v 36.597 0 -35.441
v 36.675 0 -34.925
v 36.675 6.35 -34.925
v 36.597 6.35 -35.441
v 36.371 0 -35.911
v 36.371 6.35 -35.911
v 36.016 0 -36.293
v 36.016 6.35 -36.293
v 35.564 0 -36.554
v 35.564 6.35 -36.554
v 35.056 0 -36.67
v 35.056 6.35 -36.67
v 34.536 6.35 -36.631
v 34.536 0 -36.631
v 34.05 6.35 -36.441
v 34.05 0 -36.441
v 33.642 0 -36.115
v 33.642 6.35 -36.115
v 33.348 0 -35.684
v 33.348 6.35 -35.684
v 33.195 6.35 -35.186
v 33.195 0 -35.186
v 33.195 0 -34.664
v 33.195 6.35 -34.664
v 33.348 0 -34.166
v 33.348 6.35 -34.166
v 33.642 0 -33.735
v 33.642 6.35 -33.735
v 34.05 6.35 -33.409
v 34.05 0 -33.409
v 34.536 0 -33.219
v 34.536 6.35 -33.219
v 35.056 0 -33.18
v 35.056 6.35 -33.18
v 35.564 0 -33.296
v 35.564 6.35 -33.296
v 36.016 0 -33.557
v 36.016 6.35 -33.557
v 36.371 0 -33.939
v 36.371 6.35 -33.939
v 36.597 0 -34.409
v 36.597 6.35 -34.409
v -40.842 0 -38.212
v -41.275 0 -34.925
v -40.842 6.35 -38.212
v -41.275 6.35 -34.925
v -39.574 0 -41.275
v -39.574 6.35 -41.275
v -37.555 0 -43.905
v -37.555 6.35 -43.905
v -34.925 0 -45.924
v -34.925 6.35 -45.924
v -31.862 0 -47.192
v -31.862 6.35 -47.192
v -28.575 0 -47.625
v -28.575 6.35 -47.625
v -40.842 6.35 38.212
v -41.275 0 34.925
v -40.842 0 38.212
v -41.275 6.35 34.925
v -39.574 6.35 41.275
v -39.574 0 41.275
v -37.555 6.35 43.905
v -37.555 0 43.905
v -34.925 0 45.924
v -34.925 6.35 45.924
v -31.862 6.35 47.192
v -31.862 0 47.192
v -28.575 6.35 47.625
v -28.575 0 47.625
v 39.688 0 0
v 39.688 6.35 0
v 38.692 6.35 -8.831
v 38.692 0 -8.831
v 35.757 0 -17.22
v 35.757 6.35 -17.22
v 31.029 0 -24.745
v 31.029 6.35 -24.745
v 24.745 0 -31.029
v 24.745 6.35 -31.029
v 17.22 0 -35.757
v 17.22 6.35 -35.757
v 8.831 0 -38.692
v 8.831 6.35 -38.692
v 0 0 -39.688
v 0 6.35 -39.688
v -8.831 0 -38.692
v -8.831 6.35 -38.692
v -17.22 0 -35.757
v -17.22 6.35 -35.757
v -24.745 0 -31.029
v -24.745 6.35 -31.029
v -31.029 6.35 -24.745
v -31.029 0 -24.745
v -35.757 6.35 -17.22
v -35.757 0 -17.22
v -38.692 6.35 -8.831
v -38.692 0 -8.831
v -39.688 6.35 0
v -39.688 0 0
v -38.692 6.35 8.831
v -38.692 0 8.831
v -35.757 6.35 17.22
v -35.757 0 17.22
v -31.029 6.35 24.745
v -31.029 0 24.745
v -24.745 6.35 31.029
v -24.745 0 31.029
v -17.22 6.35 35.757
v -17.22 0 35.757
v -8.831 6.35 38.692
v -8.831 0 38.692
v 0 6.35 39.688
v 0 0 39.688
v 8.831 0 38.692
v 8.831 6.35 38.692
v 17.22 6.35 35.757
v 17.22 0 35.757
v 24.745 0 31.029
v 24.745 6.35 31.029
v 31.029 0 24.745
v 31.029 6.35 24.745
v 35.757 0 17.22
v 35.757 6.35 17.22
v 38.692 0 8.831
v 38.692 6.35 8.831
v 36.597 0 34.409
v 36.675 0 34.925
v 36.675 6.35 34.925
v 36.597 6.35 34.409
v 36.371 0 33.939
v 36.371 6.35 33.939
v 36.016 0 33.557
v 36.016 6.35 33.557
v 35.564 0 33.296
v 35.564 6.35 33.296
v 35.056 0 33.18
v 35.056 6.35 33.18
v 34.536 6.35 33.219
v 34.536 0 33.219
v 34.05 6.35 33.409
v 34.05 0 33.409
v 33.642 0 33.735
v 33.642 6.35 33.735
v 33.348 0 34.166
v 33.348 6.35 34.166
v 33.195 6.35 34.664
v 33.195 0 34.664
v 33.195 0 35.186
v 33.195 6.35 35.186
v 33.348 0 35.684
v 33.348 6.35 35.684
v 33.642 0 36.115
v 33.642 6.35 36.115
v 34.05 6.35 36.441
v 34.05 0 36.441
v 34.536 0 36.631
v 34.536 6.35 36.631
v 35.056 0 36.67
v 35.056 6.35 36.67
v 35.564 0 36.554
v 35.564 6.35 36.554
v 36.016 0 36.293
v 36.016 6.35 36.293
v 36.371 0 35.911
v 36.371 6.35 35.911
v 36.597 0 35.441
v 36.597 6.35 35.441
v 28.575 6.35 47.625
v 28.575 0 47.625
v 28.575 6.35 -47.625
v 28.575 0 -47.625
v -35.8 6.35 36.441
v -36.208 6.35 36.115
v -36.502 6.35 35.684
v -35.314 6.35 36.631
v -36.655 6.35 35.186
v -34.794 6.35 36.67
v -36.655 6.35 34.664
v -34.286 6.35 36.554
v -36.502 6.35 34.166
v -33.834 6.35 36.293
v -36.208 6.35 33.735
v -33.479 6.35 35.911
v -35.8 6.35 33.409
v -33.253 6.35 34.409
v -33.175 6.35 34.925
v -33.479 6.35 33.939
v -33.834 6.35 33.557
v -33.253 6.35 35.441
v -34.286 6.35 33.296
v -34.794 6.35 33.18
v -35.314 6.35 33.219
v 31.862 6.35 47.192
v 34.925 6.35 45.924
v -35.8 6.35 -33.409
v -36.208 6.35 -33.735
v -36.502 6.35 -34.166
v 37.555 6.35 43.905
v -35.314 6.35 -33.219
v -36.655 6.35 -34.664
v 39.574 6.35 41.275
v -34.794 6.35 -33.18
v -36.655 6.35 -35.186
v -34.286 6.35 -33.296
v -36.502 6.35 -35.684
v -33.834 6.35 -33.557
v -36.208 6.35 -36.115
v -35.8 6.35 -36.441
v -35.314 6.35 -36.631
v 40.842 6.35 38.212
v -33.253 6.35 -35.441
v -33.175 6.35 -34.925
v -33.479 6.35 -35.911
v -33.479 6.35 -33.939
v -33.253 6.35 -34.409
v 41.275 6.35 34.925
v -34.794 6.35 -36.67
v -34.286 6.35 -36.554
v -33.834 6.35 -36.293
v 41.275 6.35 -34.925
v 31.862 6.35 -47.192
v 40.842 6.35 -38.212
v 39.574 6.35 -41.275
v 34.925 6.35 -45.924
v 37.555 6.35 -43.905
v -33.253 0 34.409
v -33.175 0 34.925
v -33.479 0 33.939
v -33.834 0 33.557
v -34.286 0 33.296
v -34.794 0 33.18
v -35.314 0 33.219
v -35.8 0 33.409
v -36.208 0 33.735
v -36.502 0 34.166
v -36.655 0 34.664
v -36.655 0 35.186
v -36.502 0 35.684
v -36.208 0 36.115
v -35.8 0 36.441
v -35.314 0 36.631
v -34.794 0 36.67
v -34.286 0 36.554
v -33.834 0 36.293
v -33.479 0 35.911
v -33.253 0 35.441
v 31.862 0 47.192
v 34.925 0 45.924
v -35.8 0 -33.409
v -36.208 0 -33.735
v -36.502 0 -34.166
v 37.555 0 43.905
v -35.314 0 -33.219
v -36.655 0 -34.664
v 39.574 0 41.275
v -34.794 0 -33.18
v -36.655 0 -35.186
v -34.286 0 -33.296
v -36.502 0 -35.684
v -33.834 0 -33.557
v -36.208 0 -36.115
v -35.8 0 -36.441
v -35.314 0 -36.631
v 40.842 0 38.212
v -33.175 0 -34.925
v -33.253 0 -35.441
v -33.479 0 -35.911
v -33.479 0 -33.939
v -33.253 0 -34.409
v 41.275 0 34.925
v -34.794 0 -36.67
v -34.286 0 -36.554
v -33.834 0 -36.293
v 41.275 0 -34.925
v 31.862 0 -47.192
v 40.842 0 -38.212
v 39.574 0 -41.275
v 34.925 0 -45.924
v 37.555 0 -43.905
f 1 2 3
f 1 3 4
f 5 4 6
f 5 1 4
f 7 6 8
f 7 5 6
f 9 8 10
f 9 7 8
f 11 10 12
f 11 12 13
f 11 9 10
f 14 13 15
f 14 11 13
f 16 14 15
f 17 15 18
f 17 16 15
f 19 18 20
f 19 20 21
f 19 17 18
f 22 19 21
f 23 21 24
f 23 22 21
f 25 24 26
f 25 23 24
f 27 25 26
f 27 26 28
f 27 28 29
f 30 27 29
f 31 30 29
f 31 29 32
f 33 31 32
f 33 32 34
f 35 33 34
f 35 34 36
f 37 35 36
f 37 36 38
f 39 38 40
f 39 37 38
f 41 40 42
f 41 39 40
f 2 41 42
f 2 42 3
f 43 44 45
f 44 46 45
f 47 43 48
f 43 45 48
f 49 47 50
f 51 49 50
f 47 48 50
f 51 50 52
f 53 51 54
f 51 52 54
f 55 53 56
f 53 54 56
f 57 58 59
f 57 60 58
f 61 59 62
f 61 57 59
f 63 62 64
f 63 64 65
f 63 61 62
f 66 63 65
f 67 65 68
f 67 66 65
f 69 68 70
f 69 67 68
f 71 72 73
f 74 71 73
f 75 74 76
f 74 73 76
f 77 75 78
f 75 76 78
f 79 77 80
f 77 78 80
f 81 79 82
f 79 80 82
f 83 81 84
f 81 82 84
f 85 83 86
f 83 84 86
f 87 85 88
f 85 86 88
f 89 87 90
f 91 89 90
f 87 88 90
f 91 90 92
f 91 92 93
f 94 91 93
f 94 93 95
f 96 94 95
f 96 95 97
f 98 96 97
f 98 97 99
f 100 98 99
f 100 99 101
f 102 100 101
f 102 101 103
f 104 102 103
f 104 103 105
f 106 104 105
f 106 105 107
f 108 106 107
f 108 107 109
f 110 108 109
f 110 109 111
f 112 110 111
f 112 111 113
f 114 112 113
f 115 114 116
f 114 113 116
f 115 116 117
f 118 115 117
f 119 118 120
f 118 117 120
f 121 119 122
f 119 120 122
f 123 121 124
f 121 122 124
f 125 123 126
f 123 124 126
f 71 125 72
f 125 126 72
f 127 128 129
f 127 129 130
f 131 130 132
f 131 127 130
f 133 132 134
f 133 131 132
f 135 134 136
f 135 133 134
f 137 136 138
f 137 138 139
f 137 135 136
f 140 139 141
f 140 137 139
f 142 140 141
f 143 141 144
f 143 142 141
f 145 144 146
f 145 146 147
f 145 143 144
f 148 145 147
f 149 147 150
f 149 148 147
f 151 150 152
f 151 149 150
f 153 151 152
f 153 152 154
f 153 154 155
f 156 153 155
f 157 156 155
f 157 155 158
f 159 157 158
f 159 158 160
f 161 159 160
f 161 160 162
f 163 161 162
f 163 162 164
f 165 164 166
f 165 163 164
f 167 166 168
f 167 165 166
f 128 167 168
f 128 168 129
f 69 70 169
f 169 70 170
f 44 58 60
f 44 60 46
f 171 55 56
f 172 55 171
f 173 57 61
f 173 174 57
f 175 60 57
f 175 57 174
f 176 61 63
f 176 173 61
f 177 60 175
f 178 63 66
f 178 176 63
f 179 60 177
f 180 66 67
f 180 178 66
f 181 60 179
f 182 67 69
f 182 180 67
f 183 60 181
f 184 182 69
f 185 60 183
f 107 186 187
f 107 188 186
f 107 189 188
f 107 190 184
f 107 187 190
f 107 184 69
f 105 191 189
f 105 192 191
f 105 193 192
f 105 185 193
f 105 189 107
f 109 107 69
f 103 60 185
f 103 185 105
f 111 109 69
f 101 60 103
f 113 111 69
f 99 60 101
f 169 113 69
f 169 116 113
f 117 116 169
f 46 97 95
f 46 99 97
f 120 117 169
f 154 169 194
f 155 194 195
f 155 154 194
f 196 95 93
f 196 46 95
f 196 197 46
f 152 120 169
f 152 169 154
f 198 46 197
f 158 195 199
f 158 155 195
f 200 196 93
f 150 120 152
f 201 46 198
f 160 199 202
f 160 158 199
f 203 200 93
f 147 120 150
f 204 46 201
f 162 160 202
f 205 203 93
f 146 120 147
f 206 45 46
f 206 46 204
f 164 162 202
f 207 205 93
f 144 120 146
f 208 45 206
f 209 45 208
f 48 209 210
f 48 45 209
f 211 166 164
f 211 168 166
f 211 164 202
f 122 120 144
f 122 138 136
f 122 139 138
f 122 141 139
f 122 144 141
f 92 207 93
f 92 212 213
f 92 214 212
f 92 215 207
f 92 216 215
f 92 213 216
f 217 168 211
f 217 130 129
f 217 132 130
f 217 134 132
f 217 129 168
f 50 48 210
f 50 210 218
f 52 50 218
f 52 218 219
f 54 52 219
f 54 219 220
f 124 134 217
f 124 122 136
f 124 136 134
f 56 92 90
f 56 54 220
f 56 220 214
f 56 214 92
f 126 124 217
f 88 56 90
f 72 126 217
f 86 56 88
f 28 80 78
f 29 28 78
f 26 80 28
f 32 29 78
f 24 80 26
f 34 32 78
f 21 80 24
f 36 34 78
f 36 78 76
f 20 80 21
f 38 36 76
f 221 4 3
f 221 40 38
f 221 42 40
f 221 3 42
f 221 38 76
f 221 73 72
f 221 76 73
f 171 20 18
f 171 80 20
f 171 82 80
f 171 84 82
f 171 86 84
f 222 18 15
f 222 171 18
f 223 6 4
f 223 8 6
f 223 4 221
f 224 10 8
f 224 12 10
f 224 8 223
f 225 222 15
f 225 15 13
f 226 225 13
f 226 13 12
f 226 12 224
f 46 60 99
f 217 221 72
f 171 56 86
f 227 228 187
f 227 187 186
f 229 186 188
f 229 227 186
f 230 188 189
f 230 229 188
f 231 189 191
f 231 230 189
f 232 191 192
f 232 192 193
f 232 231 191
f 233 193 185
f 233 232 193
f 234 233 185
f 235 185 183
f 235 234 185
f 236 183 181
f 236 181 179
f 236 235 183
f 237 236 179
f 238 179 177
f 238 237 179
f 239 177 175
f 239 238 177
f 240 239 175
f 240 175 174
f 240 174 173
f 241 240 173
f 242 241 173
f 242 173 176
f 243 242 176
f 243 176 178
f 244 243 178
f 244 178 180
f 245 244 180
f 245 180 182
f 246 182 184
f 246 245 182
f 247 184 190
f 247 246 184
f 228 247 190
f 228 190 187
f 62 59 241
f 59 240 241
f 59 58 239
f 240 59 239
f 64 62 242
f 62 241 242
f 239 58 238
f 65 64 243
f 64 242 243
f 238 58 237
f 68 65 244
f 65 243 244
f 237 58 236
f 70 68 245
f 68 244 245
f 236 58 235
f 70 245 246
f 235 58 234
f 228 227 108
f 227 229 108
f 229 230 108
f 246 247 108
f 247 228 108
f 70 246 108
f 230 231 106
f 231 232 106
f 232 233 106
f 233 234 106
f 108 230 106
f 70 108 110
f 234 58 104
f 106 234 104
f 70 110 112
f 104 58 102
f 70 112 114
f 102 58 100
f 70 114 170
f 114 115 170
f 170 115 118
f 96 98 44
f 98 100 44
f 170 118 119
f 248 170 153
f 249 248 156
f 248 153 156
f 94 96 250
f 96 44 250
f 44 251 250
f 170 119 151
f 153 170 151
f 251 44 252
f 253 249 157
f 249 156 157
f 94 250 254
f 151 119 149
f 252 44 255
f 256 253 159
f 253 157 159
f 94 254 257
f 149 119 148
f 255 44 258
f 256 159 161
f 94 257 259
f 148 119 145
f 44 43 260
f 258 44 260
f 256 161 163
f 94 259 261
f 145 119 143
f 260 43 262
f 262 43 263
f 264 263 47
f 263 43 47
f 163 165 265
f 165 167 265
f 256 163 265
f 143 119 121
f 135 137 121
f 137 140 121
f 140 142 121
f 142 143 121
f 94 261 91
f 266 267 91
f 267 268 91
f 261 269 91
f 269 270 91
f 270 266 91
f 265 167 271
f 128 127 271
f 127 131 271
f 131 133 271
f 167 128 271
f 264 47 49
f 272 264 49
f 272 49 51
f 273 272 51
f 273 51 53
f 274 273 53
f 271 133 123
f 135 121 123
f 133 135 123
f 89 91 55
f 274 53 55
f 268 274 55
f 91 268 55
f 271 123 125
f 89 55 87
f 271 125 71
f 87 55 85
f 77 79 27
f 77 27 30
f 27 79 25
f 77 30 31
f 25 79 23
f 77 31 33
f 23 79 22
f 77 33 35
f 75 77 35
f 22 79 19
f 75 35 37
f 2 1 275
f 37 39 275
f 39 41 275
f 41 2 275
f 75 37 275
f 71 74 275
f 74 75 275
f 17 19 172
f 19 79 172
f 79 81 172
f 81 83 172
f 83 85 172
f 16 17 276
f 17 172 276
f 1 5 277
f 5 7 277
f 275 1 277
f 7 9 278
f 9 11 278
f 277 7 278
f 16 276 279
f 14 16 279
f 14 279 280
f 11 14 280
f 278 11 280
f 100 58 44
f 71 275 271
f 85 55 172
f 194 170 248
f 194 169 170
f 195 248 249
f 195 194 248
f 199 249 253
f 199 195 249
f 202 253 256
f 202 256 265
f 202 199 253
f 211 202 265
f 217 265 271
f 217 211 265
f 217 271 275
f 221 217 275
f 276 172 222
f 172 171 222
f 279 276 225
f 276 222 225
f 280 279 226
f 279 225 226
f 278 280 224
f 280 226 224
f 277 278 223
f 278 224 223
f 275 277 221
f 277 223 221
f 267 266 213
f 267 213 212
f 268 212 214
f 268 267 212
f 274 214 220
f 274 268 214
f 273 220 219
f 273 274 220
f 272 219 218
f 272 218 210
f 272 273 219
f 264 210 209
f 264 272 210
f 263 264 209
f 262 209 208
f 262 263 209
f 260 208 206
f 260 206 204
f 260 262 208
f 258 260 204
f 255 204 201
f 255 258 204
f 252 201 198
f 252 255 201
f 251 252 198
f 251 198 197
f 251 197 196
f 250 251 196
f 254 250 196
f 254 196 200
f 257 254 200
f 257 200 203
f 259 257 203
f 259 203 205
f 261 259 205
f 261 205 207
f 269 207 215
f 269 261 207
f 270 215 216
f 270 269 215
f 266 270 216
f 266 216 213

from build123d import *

# Parameters (mm, degrees)
SKETCH1_W           = 82.55
SKETCH1_H           = 95.25
SKETCH1_R           = 38.1
SKETCH1_R_2         = 1.75
BOSS_EXTRUDE1_DEPTH = 6.35
FILLET1_R           = 12.7
SKETCH2_R           = 39.6875
SKETCH2_R_2         = 38.1
CUT_EXTRUDE1_DEPTH  = 7.35


with BuildPart() as part:
    # Sketch1 → Boss-Extrude1 (new body)
    with BuildSketch(Plane(origin=(0, 0, 0), x_dir=(1, 0, 0), z_dir=(0, 1, 0))):
        Rectangle(SKETCH1_W, SKETCH1_H)
        Circle(SKETCH1_R, mode=Mode.SUBTRACT)
        with Locations((-34.925, 34.925)):
            Circle(SKETCH1_R_2, mode=Mode.SUBTRACT)
        with Locations((-34.925, -34.925)):
            Circle(SKETCH1_R_2, mode=Mode.SUBTRACT)
        with Locations((34.925, -34.925)):
            Circle(SKETCH1_R_2, mode=Mode.SUBTRACT)
        with Locations((34.925, 34.925)):
            Circle(SKETCH1_R_2, mode=Mode.SUBTRACT)
    extrude(amount=BOSS_EXTRUDE1_DEPTH)

    # Fillet1
    fillet1_edges = [part.edges().sort_by_distance(p)[0] for p in [
        (-41.275, 3.175, -47.625),
        (41.275, 3.175, -47.625),
        (41.275, 3.175, 47.625),
        (-41.275, 3.175, 47.625),
    ]]
    fillet(fillet1_edges, radius=FILLET1_R)

    # Sketch2 → Cut-Extrude1 (cut, through all)
    with BuildSketch(Plane(origin=(0, 6.35, 0), x_dir=(1, 0, 0), z_dir=(0, 1, 0))):
        Circle(SKETCH2_R)
        Circle(SKETCH2_R_2, mode=Mode.SUBTRACT)
    extrude(amount=-CUT_EXTRUDE1_DEPTH, mode=Mode.SUBTRACT)


solid = part.part
